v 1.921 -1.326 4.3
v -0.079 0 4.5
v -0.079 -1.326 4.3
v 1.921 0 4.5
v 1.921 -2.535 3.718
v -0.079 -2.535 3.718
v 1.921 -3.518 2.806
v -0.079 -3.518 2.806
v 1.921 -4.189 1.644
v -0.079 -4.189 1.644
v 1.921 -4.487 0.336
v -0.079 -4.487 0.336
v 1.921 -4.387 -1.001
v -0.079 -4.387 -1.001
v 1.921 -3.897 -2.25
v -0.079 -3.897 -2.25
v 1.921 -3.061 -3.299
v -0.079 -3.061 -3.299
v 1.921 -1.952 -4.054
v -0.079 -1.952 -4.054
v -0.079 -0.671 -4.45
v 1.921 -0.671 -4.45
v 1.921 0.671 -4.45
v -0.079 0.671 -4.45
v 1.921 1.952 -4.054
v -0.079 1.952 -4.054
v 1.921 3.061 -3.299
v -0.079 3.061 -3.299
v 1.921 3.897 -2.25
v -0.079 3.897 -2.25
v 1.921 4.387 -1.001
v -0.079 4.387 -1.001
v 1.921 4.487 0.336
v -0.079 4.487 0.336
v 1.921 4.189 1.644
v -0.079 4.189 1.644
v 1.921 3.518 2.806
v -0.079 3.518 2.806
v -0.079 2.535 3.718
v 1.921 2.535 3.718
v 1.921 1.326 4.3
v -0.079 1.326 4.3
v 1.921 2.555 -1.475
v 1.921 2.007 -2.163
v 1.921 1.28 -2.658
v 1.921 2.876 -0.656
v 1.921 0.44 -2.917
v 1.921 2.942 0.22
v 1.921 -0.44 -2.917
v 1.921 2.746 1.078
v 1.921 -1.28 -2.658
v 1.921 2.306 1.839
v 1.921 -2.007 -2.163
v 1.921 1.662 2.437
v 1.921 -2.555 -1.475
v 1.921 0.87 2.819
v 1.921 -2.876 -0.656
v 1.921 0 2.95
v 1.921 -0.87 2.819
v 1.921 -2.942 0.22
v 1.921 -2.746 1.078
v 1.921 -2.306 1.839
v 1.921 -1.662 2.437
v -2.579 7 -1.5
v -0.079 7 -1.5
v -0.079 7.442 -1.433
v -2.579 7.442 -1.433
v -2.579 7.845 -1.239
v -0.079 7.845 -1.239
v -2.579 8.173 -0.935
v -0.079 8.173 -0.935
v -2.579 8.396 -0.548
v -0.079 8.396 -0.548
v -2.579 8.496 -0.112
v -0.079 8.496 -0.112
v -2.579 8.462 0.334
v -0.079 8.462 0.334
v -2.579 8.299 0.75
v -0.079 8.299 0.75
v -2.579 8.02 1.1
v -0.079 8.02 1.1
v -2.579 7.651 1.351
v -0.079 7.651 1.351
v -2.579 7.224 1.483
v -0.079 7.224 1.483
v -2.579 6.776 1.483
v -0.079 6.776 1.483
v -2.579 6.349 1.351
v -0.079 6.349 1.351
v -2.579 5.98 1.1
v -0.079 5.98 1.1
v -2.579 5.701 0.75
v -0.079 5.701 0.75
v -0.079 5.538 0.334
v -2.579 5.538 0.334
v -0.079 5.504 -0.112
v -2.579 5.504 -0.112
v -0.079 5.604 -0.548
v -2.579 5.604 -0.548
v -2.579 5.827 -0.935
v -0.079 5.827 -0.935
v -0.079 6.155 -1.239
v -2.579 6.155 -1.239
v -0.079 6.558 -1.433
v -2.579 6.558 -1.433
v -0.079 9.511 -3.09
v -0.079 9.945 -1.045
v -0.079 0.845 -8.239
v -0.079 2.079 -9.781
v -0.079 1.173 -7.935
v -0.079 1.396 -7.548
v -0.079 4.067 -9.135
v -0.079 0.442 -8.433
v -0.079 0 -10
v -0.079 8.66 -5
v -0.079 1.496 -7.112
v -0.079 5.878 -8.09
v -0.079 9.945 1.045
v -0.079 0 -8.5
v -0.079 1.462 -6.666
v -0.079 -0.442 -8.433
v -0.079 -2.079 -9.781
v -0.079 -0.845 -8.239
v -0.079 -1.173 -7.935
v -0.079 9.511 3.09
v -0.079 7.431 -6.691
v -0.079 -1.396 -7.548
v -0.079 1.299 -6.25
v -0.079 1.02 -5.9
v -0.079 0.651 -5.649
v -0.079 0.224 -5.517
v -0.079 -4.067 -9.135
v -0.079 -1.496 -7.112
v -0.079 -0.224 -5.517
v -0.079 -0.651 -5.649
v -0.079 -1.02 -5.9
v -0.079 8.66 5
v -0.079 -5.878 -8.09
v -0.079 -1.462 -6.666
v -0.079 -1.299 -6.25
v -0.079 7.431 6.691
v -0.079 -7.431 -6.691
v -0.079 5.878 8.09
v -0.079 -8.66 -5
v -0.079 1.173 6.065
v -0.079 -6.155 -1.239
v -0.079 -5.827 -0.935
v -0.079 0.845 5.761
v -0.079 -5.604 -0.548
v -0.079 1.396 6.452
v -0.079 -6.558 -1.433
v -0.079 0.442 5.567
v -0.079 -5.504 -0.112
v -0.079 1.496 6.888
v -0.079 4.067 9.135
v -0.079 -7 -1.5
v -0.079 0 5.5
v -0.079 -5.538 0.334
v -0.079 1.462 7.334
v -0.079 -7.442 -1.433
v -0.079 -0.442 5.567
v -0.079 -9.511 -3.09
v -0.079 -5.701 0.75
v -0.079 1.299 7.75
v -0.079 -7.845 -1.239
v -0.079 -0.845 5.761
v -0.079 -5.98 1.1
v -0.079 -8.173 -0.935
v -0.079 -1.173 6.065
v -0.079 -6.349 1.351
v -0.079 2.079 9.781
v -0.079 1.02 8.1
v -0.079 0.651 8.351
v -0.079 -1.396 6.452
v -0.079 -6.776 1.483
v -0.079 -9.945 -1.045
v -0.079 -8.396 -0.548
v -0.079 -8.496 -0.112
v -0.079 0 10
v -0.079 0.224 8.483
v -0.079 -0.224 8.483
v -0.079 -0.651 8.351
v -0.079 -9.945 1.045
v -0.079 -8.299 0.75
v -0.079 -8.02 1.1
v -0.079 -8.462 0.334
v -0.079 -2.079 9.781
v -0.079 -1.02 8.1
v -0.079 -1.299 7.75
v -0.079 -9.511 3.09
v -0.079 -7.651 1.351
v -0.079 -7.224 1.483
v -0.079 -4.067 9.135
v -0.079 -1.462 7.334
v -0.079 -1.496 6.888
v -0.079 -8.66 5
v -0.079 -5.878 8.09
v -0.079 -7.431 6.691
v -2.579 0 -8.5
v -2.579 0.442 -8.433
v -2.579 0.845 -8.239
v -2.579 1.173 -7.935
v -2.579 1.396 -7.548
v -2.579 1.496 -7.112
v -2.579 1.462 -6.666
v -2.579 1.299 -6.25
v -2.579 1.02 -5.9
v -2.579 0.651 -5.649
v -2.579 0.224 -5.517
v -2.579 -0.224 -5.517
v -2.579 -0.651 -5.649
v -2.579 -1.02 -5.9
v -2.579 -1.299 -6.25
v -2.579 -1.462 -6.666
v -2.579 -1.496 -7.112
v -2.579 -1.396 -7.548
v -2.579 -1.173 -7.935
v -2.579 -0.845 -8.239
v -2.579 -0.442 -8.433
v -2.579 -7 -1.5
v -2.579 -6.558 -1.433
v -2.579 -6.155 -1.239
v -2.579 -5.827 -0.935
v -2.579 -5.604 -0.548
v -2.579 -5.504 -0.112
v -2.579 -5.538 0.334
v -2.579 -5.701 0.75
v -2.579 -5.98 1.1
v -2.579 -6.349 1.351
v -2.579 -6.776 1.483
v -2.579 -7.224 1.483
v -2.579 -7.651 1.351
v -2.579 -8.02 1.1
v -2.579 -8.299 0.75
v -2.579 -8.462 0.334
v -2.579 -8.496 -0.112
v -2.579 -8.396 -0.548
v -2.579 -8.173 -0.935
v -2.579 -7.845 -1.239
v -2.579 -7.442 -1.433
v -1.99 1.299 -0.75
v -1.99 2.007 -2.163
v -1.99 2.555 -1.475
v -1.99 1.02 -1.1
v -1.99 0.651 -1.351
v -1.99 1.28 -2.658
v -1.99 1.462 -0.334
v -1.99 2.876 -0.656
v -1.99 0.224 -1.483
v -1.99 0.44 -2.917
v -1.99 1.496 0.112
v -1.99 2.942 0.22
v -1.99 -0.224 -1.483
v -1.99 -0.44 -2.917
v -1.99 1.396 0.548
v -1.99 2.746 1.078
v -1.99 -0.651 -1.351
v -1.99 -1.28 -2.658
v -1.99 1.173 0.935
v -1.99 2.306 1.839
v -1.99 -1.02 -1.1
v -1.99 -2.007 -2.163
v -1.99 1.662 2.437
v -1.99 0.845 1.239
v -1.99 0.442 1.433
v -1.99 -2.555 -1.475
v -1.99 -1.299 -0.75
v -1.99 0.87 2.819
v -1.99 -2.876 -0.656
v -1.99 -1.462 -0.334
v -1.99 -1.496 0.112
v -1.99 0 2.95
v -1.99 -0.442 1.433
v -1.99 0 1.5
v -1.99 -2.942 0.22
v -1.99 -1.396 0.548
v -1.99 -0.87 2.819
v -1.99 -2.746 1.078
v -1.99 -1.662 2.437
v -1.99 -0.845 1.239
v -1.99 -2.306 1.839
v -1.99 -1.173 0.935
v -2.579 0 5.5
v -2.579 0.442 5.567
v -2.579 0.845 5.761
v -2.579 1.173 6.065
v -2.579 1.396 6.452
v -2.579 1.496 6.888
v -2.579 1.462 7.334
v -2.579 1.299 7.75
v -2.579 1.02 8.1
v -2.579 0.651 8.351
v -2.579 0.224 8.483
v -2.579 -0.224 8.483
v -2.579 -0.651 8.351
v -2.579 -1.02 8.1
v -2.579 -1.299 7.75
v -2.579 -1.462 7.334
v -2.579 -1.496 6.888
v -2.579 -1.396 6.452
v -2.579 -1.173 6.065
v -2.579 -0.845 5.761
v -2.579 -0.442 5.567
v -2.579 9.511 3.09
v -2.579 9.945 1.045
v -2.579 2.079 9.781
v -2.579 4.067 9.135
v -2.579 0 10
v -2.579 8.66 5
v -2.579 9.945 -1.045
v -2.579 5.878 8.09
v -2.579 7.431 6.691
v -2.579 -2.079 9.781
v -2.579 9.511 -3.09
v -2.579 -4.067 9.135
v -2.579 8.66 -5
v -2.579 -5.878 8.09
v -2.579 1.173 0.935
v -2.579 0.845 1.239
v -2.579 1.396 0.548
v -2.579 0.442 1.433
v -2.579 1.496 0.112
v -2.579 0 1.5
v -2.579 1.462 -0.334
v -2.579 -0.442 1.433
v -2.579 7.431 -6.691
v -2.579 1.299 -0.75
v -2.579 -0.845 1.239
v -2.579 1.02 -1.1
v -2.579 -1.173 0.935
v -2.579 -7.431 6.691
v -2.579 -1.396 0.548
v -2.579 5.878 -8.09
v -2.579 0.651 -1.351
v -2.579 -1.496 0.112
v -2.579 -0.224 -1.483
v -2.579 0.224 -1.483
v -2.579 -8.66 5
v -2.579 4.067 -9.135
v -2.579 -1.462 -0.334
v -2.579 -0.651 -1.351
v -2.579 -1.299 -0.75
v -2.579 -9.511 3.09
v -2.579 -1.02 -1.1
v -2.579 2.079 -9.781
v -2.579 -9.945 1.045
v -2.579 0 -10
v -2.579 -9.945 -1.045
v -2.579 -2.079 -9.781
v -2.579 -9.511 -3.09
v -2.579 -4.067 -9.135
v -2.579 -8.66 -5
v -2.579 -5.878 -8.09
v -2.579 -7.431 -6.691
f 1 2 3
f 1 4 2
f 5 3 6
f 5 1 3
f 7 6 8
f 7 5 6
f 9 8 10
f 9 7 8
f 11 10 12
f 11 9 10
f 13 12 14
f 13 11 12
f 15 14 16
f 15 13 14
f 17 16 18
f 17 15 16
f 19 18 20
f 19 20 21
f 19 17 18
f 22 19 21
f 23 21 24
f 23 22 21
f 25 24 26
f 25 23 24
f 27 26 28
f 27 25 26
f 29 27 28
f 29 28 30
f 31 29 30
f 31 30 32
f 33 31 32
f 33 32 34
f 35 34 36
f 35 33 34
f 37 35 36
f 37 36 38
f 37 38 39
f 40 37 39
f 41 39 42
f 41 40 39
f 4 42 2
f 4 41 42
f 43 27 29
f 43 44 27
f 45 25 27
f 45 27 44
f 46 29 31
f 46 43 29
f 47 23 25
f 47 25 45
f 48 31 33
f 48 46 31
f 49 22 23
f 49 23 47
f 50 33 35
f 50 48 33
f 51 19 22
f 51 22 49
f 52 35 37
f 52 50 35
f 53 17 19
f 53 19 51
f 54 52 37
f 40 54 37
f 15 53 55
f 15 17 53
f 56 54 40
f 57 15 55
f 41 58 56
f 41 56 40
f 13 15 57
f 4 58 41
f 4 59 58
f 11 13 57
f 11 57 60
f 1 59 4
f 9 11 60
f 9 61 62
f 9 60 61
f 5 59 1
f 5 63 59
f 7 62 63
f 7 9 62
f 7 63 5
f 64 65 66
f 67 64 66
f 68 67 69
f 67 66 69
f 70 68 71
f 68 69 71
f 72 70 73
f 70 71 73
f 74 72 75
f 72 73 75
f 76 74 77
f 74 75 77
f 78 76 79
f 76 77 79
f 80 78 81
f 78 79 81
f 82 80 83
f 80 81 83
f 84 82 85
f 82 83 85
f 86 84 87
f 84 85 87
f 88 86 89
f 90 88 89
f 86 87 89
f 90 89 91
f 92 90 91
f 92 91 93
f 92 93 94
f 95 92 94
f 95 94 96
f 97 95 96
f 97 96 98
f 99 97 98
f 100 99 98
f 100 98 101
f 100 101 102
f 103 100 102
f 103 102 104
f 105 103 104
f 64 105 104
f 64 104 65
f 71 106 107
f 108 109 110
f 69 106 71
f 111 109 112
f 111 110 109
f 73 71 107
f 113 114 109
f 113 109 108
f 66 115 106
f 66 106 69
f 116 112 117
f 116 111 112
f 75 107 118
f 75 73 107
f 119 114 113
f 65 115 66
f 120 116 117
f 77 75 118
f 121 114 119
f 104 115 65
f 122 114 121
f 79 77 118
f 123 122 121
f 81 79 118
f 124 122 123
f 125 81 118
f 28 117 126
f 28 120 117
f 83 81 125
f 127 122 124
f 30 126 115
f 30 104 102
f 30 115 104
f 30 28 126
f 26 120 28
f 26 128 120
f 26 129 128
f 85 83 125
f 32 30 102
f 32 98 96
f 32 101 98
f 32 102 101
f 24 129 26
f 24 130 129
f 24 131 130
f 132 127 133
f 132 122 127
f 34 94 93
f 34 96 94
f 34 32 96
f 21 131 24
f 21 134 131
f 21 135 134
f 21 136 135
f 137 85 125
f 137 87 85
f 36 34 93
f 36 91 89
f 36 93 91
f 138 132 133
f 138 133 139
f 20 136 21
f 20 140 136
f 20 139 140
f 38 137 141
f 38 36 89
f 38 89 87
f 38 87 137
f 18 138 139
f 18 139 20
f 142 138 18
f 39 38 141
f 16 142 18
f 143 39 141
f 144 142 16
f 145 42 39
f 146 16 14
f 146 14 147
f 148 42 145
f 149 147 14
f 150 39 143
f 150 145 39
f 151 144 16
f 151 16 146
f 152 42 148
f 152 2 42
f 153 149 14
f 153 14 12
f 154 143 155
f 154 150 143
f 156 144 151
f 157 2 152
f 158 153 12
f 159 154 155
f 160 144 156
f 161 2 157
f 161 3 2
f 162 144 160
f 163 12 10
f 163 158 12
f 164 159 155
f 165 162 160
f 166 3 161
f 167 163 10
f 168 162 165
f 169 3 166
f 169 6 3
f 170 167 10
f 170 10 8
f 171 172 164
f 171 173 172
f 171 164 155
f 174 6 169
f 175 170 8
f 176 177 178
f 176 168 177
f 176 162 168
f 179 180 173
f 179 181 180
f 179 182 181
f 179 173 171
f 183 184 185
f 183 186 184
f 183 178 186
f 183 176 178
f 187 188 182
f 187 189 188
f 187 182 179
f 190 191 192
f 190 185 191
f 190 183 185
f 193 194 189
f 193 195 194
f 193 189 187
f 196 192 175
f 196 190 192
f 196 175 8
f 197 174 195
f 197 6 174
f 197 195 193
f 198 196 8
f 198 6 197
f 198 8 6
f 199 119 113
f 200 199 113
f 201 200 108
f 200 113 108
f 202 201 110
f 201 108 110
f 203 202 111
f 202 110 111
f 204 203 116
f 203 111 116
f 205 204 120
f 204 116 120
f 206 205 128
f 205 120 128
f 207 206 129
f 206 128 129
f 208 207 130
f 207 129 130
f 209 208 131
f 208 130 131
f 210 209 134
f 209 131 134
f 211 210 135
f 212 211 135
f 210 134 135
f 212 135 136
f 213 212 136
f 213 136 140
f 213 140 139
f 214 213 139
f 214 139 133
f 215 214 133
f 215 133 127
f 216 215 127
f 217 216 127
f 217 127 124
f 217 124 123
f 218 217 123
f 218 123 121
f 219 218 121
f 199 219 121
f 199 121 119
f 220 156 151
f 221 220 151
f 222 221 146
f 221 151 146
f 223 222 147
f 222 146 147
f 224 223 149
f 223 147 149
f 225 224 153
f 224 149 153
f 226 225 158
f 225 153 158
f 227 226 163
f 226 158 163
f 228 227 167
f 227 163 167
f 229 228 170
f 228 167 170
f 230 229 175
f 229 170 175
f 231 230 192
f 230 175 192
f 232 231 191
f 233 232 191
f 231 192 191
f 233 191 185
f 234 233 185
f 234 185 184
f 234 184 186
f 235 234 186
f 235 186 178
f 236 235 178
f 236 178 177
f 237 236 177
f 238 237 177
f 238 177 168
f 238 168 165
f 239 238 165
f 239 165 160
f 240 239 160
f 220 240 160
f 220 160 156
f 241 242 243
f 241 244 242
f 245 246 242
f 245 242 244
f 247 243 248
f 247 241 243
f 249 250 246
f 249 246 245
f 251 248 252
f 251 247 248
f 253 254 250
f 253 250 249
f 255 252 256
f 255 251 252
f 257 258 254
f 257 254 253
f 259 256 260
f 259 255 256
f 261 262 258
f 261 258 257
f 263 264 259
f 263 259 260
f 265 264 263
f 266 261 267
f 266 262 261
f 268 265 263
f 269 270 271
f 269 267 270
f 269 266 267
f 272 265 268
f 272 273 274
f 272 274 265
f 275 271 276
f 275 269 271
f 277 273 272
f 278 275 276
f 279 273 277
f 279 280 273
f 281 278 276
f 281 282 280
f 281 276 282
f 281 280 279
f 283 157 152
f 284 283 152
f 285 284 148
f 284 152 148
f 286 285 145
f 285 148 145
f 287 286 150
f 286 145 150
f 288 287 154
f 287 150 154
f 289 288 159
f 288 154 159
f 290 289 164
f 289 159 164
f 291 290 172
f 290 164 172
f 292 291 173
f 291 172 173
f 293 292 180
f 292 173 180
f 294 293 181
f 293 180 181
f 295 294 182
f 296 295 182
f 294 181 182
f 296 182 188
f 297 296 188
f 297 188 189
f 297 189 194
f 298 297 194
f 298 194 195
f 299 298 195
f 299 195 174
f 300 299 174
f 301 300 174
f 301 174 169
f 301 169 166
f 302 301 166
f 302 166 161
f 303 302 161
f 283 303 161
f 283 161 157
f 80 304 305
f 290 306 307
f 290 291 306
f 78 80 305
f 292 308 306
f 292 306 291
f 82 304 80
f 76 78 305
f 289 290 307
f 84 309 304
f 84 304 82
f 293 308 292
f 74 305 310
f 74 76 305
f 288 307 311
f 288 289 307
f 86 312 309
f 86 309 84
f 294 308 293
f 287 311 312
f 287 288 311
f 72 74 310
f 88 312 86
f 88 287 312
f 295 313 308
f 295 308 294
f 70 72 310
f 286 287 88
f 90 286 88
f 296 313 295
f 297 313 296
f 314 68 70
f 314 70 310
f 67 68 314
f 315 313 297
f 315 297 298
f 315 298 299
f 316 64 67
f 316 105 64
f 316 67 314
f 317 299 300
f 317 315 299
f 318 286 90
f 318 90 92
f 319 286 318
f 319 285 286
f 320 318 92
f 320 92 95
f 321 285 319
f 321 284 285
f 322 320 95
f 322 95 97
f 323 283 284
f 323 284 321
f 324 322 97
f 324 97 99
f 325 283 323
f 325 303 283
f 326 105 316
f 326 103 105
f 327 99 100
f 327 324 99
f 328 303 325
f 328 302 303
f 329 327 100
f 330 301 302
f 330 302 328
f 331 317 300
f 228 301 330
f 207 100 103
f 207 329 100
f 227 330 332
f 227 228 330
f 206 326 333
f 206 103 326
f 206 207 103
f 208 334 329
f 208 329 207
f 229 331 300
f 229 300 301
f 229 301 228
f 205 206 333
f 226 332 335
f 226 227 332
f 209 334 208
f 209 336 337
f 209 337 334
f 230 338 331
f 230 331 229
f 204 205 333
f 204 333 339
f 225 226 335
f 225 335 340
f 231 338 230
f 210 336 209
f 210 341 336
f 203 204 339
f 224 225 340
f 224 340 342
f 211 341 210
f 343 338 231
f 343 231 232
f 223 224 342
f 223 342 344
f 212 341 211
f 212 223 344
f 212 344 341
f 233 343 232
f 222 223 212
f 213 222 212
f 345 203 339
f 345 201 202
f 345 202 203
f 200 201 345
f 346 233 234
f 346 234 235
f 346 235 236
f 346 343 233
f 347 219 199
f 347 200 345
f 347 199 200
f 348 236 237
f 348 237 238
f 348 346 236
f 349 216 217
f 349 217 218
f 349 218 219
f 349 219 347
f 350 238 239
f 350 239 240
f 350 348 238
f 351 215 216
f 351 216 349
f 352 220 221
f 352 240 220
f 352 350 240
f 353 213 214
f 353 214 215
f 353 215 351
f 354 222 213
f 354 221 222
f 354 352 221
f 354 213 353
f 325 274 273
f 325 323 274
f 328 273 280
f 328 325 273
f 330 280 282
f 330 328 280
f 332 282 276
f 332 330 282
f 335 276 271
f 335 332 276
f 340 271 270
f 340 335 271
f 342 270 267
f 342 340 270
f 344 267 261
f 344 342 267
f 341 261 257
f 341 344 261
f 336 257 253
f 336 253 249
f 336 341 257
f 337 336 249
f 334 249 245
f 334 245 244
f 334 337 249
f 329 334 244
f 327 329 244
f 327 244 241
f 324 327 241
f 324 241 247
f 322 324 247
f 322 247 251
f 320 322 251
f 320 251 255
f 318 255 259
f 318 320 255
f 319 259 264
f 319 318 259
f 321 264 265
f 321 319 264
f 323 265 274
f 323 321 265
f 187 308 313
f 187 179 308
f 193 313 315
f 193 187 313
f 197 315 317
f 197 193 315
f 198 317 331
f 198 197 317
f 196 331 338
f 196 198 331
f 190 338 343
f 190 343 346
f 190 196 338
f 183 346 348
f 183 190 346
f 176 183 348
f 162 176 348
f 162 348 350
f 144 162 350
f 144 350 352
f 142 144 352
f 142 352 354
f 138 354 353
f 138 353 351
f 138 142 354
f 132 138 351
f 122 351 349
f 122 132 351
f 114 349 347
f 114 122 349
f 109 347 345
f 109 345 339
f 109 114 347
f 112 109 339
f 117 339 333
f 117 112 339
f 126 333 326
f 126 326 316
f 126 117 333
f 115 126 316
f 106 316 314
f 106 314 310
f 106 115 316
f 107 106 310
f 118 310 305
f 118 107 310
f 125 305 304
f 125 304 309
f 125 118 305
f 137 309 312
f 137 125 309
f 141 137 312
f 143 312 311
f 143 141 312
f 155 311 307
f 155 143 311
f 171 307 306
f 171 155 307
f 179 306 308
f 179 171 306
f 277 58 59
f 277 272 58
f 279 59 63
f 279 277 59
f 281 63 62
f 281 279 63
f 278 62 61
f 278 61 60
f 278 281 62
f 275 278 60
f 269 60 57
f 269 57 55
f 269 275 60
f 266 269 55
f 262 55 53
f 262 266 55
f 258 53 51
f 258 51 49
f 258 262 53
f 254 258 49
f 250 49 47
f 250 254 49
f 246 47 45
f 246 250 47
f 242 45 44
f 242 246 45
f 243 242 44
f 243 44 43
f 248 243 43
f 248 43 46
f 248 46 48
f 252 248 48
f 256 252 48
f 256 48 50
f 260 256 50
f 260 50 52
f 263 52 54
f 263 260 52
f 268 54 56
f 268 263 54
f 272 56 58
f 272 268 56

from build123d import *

# Parameters (mm, degrees)
SKETCH_2_R          = 1.5
CUT_EXTRUDE_1_DEPTH = 10


with BuildPart() as part:
    # 草图1 → 旋转1 (revolve)
    with BuildSketch(Plane.XY, mode=Mode.PRIVATE) as revolve_1_sk:
        Polygon((-2.579365079, 1.5), (-2.579365079, 10), (-0.079365079, 10), (-0.079365079, 4.5), (1.920634921, 4.5), (1.920634921, 2.95), (-1.989795918, 2.95), (-1.989795918, 1.5), align=None)
    revolve(revolve_1_sk.sketch.rotate(Axis((-8.588435374, 0, 0), (1, 0, 0)), 90), axis=Axis((-8.588435374, 0, 0), (1, 0, 0)))

    # 草图2 → 切除-拉伸1 (cut)
    with BuildSketch(Plane(origin=(-0.079365079, 0, 0), x_dir=(0, 0, -1), z_dir=(1, 0, 0))):
        with Locations((0, 7)):
            Circle(SKETCH_2_R)
        with Locations((7, 0)):
            Circle(SKETCH_2_R)
        with Locations((0, -7)):
            Circle(SKETCH_2_R)
        with Locations((-7, 0)):
            Circle(SKETCH_2_R)
    extrude(amount=-CUT_EXTRUDE_1_DEPTH, mode=Mode.SUBTRACT)


solid = part.part
